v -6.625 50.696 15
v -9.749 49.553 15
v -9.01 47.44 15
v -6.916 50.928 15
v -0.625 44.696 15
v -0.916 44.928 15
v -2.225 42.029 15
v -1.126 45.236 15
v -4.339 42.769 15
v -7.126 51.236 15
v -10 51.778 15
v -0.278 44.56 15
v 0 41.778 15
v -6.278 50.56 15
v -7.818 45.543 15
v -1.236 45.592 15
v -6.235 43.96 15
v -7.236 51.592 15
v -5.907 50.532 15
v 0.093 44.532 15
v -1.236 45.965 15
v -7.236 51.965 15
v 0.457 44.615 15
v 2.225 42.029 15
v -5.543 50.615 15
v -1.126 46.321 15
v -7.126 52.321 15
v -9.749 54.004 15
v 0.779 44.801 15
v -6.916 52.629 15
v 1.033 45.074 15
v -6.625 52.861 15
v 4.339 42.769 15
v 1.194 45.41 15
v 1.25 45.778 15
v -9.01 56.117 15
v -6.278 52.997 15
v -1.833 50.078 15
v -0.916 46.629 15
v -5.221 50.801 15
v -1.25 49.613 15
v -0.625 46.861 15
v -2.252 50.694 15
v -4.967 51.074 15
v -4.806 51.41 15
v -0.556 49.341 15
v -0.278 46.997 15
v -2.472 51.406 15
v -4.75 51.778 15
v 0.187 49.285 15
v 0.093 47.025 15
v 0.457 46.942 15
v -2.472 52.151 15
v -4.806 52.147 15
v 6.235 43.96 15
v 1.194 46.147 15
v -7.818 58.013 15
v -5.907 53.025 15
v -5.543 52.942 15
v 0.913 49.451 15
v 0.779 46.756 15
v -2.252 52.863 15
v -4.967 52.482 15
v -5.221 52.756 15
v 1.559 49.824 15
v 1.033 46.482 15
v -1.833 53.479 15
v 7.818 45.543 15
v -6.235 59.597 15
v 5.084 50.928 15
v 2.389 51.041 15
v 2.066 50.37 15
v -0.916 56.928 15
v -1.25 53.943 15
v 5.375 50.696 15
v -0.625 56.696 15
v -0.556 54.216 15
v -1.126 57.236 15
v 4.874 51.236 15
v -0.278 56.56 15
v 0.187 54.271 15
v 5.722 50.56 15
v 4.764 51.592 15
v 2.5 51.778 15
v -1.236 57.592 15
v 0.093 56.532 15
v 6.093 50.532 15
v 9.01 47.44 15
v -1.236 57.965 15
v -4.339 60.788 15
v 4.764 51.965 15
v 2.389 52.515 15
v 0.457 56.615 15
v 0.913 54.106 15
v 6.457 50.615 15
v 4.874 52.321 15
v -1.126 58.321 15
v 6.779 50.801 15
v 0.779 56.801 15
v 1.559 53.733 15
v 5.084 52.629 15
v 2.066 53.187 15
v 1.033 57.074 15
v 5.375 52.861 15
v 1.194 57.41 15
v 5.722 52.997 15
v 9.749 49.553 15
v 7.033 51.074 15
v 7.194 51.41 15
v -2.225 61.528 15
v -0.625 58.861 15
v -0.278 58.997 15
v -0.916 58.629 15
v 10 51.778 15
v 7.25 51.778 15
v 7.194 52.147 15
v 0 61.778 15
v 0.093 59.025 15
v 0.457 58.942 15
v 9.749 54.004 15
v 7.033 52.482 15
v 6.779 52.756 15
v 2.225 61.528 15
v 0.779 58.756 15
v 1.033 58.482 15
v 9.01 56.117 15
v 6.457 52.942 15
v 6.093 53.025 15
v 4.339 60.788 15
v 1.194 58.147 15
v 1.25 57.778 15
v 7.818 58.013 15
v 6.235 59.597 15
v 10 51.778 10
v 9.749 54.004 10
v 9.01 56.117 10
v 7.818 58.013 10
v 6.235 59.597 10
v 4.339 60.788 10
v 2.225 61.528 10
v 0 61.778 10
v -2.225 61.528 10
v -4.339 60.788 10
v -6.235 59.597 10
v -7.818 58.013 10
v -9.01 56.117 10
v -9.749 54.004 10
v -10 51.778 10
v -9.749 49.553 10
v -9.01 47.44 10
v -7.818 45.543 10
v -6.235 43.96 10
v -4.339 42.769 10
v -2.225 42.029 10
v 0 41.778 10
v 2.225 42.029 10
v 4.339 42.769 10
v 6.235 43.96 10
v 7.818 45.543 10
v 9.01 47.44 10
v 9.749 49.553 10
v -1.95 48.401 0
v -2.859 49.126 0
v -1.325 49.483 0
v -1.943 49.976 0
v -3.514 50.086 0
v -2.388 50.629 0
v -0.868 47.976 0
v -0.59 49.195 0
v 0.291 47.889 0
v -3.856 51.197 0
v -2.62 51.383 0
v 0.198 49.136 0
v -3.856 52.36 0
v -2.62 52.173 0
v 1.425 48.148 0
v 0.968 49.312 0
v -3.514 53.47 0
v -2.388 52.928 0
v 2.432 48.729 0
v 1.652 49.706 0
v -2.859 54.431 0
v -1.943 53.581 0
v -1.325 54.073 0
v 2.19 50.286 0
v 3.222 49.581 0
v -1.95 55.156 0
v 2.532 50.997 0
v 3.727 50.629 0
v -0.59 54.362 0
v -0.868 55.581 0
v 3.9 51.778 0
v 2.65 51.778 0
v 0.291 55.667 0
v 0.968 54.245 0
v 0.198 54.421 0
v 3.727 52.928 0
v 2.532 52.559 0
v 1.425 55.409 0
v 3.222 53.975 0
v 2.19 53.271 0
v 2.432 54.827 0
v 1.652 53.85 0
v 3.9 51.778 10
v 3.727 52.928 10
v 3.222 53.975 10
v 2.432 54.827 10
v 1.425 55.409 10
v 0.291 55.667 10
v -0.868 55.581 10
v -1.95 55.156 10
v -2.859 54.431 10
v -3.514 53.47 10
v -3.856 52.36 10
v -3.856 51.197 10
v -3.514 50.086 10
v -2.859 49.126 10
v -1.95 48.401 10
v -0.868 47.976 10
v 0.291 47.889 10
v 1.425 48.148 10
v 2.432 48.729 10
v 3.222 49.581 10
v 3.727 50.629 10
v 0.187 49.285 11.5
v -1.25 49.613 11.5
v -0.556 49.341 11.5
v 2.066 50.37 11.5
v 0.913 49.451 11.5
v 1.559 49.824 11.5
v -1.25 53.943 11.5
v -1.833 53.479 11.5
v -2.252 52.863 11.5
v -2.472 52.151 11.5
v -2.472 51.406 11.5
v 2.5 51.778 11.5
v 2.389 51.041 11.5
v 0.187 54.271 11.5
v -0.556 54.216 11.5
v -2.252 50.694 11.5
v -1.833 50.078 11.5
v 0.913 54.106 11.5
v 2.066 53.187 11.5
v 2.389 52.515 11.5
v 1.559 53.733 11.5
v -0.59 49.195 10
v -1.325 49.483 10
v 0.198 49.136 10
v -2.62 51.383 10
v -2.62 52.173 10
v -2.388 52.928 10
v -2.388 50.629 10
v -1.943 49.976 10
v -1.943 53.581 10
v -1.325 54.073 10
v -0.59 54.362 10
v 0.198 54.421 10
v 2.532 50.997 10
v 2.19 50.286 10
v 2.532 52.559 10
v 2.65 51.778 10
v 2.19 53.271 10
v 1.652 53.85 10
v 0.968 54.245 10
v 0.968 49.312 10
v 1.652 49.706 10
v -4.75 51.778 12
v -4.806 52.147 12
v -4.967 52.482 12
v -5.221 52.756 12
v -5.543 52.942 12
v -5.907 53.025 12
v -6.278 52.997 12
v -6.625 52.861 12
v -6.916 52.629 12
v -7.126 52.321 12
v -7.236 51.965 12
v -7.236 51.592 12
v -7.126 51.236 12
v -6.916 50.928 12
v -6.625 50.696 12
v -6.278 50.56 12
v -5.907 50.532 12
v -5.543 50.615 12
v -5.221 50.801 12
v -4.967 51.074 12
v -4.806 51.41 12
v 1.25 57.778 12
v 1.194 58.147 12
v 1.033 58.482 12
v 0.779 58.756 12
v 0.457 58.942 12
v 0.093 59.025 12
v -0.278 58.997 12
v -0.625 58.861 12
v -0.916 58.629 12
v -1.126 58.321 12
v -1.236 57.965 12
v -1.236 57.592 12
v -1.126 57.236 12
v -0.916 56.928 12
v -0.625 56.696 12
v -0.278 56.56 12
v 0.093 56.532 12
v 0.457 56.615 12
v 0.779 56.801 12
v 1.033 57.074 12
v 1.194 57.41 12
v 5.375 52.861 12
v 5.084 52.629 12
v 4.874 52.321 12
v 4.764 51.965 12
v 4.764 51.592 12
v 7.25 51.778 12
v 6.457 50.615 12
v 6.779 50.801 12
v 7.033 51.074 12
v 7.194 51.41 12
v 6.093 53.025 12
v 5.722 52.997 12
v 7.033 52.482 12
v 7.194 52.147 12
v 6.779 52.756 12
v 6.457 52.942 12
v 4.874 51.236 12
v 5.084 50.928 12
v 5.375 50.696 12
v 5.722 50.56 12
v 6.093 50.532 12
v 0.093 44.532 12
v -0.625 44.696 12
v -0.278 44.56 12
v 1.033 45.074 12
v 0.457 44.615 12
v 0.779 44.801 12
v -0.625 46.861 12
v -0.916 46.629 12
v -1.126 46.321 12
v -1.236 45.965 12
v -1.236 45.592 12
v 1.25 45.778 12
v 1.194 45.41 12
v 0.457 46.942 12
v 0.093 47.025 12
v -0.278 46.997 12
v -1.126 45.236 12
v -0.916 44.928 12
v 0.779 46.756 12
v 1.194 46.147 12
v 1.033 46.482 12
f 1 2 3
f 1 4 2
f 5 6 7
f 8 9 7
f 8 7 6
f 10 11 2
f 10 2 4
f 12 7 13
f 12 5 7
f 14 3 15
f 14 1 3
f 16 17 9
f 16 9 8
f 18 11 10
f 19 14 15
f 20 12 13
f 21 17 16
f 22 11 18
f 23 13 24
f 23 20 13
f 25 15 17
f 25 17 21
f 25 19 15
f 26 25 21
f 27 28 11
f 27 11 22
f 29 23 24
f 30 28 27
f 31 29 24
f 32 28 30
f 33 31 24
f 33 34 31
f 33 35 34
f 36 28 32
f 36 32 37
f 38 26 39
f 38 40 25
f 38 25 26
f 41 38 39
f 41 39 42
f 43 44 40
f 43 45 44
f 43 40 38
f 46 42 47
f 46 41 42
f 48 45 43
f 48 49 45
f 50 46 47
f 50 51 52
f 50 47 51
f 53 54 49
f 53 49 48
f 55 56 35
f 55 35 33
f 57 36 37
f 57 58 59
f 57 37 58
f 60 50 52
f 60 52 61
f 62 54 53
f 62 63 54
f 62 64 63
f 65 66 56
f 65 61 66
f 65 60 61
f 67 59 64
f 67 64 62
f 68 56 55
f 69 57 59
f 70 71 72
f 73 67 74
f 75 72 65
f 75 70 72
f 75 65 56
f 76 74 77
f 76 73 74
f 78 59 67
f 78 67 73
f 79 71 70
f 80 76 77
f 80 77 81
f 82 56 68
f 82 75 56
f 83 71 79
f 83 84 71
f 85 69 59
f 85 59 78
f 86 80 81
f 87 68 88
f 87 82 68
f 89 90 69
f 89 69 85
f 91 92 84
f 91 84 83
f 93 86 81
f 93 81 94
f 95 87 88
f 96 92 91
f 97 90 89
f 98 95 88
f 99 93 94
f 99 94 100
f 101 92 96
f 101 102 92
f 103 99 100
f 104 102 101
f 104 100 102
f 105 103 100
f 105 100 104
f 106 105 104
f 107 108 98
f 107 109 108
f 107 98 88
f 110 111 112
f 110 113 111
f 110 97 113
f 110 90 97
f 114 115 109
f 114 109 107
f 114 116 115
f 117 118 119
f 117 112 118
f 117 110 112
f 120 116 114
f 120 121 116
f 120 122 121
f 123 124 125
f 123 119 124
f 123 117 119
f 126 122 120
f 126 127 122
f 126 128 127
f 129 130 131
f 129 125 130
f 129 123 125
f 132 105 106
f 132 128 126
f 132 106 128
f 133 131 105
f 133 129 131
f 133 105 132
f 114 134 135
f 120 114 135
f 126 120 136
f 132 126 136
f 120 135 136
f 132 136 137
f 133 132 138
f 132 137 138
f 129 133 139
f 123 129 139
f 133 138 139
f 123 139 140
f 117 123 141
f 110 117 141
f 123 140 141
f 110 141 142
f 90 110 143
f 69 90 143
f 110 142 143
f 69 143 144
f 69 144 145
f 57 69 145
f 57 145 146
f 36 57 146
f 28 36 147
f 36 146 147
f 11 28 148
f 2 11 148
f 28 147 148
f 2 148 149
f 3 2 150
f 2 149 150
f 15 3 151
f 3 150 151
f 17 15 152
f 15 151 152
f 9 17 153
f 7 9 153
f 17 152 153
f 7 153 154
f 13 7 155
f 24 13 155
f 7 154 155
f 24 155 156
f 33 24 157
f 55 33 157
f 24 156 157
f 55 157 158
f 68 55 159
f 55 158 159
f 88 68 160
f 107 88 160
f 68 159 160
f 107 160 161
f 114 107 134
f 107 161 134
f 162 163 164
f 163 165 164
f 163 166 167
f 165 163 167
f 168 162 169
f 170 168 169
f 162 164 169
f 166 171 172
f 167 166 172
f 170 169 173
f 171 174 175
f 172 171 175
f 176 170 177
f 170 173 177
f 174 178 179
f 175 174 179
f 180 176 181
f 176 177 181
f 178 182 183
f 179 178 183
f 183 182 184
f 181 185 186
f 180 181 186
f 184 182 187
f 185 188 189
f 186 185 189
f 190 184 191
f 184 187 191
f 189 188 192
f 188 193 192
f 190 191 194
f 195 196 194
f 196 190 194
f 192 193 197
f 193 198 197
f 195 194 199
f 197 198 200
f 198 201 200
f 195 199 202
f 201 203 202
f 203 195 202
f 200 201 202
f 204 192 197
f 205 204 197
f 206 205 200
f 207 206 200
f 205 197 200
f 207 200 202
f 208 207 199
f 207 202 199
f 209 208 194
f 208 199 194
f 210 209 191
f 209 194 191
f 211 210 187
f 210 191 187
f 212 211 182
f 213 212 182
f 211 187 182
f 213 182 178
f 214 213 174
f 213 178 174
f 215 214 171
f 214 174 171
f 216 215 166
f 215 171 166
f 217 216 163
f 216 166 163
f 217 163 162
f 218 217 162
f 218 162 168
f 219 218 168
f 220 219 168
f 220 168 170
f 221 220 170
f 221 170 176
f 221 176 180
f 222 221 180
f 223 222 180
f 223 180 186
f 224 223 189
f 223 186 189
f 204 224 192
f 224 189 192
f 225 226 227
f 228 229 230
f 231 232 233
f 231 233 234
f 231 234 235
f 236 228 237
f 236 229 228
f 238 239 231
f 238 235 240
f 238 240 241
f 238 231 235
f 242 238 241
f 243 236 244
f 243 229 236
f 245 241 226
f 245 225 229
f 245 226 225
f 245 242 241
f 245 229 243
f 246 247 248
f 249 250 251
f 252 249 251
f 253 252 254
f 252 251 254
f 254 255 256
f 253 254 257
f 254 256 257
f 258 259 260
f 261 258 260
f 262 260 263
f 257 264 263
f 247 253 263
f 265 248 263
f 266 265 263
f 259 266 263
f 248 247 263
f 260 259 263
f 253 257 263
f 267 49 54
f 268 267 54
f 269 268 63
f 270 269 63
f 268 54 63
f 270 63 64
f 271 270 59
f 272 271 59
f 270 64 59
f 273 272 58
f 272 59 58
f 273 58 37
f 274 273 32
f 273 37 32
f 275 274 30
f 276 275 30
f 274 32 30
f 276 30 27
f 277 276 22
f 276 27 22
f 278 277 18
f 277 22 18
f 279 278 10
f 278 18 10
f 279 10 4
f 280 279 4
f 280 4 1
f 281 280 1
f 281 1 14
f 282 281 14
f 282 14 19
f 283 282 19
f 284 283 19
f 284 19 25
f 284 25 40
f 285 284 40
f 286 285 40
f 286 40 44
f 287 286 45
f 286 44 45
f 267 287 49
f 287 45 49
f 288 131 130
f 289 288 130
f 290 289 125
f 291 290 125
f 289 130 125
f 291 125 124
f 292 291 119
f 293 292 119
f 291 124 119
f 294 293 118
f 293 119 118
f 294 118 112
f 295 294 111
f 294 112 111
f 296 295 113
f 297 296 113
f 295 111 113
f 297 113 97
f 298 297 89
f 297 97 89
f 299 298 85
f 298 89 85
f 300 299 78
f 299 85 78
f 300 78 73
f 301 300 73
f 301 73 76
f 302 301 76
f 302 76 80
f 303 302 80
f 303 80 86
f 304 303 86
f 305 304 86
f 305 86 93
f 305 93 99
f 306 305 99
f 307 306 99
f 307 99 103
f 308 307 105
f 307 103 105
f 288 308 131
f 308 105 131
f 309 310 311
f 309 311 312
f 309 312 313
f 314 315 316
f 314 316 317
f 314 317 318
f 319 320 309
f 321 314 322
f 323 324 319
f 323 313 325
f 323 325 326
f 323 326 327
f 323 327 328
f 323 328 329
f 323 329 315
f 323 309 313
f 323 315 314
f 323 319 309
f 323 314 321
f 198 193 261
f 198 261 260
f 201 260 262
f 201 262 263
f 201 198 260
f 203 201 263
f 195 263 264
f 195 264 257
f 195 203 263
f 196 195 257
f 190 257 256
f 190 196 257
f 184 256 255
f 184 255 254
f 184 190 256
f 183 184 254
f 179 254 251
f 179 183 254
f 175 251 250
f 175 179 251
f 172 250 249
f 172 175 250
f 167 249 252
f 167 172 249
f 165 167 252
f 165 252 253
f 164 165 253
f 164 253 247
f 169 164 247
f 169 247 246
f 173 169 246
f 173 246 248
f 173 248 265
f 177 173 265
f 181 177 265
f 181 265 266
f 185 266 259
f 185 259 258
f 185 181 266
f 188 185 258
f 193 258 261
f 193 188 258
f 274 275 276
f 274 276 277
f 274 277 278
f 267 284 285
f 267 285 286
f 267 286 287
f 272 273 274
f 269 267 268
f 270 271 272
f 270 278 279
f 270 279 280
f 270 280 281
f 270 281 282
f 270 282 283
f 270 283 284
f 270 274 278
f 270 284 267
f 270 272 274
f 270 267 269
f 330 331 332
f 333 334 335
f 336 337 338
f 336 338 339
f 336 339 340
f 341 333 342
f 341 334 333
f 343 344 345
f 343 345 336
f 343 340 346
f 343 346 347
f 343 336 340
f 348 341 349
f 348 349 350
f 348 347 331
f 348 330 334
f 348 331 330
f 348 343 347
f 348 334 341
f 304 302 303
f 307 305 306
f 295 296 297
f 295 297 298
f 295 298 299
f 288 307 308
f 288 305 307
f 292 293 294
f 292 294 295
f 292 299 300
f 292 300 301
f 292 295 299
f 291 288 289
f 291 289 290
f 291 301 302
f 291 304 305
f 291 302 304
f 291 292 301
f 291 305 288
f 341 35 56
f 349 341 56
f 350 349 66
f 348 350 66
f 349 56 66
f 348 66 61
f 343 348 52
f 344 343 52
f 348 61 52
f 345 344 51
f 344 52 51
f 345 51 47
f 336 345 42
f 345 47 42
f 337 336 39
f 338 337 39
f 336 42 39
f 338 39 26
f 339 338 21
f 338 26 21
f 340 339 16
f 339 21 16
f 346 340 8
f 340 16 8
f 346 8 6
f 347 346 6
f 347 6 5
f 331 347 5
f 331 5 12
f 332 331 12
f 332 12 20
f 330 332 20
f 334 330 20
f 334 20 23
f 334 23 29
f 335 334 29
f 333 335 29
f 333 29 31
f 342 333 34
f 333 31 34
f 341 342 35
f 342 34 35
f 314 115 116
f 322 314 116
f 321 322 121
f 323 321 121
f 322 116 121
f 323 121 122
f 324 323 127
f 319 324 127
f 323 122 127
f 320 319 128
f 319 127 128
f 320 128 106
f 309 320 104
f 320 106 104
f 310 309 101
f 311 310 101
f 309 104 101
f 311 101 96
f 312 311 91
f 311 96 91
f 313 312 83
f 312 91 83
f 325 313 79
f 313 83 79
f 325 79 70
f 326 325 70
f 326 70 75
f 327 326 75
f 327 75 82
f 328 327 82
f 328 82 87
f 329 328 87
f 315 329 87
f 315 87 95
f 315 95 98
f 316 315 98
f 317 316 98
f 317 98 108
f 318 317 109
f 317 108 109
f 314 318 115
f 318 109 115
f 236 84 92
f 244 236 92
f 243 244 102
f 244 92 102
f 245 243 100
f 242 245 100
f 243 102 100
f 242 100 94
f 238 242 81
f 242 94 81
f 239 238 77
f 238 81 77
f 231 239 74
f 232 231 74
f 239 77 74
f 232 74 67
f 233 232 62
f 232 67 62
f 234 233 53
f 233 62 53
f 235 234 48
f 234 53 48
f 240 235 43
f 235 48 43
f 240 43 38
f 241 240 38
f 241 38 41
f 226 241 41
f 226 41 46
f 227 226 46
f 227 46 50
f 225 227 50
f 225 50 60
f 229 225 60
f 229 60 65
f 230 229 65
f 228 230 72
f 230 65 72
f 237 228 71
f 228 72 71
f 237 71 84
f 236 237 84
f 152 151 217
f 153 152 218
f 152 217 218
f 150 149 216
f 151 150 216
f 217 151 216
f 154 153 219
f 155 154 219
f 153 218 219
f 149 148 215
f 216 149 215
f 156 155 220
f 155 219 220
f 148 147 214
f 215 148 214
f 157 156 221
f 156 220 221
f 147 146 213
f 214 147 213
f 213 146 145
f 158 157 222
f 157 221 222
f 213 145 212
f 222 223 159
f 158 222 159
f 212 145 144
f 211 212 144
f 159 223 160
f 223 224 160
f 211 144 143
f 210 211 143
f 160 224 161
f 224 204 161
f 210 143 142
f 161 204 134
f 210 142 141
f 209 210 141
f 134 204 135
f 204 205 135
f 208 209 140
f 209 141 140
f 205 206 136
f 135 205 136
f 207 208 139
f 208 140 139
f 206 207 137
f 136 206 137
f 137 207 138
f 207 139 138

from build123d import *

# Parameters (mm, degrees)
SKETCH_1_R          = 3.9
SKETCH_1_R_2        = 2.65
EXTRUDE_1_DEPTH     = 10
SKETCH_3_R          = 10
EXTRUDE_2_DEPTH     = 5
SKETCH_5_R          = 1.25
CUT_EXTRUDE_1_DEPTH = 3
SKETCH_7_R          = 2.5
CUT_EXTRUDE_2_DEPTH = 3.5


with BuildPart() as part:
    # 草图1 → 凸台-拉伸1 (new body)
    with BuildSketch(Plane.XY):
        with Locations((0, 51.778341992)):
            Circle(SKETCH_1_R)
        with Locations((0, 51.778341992)):
            Circle(SKETCH_1_R_2, mode=Mode.SUBTRACT)
    extrude(amount=EXTRUDE_1_DEPTH)

    # 草图3 → 凸台-拉伸2 (add)
    with BuildSketch(Plane.XY.offset(10)):
        with Locations((0, 51.778341992)):
            Circle(SKETCH_3_R)
    extrude(amount=EXTRUDE_2_DEPTH)

    # 草图5 → 切除-拉伸1 (cut)
    with BuildSketch(Plane.XY.offset(15)):
        with Locations((6, 51.778341992)):
            Circle(SKETCH_5_R)
        with Locations((0, 57.778341992)):
            Circle(SKETCH_5_R)
        with Locations((0, 45.778341992)):
            Circle(SKETCH_5_R)
        with Locations((-6, 51.778341992)):
            Circle(SKETCH_5_R)
    extrude(amount=-CUT_EXTRUDE_1_DEPTH, mode=Mode.SUBTRACT)

    # 草图7 → 切除-拉伸2 (cut)
    with BuildSketch(Plane.XY.offset(15)):
        with Locations((0, 51.778341992)):
            Circle(SKETCH_7_R)
    extrude(amount=-CUT_EXTRUDE_2_DEPTH, mode=Mode.SUBTRACT)


solid = part.part
